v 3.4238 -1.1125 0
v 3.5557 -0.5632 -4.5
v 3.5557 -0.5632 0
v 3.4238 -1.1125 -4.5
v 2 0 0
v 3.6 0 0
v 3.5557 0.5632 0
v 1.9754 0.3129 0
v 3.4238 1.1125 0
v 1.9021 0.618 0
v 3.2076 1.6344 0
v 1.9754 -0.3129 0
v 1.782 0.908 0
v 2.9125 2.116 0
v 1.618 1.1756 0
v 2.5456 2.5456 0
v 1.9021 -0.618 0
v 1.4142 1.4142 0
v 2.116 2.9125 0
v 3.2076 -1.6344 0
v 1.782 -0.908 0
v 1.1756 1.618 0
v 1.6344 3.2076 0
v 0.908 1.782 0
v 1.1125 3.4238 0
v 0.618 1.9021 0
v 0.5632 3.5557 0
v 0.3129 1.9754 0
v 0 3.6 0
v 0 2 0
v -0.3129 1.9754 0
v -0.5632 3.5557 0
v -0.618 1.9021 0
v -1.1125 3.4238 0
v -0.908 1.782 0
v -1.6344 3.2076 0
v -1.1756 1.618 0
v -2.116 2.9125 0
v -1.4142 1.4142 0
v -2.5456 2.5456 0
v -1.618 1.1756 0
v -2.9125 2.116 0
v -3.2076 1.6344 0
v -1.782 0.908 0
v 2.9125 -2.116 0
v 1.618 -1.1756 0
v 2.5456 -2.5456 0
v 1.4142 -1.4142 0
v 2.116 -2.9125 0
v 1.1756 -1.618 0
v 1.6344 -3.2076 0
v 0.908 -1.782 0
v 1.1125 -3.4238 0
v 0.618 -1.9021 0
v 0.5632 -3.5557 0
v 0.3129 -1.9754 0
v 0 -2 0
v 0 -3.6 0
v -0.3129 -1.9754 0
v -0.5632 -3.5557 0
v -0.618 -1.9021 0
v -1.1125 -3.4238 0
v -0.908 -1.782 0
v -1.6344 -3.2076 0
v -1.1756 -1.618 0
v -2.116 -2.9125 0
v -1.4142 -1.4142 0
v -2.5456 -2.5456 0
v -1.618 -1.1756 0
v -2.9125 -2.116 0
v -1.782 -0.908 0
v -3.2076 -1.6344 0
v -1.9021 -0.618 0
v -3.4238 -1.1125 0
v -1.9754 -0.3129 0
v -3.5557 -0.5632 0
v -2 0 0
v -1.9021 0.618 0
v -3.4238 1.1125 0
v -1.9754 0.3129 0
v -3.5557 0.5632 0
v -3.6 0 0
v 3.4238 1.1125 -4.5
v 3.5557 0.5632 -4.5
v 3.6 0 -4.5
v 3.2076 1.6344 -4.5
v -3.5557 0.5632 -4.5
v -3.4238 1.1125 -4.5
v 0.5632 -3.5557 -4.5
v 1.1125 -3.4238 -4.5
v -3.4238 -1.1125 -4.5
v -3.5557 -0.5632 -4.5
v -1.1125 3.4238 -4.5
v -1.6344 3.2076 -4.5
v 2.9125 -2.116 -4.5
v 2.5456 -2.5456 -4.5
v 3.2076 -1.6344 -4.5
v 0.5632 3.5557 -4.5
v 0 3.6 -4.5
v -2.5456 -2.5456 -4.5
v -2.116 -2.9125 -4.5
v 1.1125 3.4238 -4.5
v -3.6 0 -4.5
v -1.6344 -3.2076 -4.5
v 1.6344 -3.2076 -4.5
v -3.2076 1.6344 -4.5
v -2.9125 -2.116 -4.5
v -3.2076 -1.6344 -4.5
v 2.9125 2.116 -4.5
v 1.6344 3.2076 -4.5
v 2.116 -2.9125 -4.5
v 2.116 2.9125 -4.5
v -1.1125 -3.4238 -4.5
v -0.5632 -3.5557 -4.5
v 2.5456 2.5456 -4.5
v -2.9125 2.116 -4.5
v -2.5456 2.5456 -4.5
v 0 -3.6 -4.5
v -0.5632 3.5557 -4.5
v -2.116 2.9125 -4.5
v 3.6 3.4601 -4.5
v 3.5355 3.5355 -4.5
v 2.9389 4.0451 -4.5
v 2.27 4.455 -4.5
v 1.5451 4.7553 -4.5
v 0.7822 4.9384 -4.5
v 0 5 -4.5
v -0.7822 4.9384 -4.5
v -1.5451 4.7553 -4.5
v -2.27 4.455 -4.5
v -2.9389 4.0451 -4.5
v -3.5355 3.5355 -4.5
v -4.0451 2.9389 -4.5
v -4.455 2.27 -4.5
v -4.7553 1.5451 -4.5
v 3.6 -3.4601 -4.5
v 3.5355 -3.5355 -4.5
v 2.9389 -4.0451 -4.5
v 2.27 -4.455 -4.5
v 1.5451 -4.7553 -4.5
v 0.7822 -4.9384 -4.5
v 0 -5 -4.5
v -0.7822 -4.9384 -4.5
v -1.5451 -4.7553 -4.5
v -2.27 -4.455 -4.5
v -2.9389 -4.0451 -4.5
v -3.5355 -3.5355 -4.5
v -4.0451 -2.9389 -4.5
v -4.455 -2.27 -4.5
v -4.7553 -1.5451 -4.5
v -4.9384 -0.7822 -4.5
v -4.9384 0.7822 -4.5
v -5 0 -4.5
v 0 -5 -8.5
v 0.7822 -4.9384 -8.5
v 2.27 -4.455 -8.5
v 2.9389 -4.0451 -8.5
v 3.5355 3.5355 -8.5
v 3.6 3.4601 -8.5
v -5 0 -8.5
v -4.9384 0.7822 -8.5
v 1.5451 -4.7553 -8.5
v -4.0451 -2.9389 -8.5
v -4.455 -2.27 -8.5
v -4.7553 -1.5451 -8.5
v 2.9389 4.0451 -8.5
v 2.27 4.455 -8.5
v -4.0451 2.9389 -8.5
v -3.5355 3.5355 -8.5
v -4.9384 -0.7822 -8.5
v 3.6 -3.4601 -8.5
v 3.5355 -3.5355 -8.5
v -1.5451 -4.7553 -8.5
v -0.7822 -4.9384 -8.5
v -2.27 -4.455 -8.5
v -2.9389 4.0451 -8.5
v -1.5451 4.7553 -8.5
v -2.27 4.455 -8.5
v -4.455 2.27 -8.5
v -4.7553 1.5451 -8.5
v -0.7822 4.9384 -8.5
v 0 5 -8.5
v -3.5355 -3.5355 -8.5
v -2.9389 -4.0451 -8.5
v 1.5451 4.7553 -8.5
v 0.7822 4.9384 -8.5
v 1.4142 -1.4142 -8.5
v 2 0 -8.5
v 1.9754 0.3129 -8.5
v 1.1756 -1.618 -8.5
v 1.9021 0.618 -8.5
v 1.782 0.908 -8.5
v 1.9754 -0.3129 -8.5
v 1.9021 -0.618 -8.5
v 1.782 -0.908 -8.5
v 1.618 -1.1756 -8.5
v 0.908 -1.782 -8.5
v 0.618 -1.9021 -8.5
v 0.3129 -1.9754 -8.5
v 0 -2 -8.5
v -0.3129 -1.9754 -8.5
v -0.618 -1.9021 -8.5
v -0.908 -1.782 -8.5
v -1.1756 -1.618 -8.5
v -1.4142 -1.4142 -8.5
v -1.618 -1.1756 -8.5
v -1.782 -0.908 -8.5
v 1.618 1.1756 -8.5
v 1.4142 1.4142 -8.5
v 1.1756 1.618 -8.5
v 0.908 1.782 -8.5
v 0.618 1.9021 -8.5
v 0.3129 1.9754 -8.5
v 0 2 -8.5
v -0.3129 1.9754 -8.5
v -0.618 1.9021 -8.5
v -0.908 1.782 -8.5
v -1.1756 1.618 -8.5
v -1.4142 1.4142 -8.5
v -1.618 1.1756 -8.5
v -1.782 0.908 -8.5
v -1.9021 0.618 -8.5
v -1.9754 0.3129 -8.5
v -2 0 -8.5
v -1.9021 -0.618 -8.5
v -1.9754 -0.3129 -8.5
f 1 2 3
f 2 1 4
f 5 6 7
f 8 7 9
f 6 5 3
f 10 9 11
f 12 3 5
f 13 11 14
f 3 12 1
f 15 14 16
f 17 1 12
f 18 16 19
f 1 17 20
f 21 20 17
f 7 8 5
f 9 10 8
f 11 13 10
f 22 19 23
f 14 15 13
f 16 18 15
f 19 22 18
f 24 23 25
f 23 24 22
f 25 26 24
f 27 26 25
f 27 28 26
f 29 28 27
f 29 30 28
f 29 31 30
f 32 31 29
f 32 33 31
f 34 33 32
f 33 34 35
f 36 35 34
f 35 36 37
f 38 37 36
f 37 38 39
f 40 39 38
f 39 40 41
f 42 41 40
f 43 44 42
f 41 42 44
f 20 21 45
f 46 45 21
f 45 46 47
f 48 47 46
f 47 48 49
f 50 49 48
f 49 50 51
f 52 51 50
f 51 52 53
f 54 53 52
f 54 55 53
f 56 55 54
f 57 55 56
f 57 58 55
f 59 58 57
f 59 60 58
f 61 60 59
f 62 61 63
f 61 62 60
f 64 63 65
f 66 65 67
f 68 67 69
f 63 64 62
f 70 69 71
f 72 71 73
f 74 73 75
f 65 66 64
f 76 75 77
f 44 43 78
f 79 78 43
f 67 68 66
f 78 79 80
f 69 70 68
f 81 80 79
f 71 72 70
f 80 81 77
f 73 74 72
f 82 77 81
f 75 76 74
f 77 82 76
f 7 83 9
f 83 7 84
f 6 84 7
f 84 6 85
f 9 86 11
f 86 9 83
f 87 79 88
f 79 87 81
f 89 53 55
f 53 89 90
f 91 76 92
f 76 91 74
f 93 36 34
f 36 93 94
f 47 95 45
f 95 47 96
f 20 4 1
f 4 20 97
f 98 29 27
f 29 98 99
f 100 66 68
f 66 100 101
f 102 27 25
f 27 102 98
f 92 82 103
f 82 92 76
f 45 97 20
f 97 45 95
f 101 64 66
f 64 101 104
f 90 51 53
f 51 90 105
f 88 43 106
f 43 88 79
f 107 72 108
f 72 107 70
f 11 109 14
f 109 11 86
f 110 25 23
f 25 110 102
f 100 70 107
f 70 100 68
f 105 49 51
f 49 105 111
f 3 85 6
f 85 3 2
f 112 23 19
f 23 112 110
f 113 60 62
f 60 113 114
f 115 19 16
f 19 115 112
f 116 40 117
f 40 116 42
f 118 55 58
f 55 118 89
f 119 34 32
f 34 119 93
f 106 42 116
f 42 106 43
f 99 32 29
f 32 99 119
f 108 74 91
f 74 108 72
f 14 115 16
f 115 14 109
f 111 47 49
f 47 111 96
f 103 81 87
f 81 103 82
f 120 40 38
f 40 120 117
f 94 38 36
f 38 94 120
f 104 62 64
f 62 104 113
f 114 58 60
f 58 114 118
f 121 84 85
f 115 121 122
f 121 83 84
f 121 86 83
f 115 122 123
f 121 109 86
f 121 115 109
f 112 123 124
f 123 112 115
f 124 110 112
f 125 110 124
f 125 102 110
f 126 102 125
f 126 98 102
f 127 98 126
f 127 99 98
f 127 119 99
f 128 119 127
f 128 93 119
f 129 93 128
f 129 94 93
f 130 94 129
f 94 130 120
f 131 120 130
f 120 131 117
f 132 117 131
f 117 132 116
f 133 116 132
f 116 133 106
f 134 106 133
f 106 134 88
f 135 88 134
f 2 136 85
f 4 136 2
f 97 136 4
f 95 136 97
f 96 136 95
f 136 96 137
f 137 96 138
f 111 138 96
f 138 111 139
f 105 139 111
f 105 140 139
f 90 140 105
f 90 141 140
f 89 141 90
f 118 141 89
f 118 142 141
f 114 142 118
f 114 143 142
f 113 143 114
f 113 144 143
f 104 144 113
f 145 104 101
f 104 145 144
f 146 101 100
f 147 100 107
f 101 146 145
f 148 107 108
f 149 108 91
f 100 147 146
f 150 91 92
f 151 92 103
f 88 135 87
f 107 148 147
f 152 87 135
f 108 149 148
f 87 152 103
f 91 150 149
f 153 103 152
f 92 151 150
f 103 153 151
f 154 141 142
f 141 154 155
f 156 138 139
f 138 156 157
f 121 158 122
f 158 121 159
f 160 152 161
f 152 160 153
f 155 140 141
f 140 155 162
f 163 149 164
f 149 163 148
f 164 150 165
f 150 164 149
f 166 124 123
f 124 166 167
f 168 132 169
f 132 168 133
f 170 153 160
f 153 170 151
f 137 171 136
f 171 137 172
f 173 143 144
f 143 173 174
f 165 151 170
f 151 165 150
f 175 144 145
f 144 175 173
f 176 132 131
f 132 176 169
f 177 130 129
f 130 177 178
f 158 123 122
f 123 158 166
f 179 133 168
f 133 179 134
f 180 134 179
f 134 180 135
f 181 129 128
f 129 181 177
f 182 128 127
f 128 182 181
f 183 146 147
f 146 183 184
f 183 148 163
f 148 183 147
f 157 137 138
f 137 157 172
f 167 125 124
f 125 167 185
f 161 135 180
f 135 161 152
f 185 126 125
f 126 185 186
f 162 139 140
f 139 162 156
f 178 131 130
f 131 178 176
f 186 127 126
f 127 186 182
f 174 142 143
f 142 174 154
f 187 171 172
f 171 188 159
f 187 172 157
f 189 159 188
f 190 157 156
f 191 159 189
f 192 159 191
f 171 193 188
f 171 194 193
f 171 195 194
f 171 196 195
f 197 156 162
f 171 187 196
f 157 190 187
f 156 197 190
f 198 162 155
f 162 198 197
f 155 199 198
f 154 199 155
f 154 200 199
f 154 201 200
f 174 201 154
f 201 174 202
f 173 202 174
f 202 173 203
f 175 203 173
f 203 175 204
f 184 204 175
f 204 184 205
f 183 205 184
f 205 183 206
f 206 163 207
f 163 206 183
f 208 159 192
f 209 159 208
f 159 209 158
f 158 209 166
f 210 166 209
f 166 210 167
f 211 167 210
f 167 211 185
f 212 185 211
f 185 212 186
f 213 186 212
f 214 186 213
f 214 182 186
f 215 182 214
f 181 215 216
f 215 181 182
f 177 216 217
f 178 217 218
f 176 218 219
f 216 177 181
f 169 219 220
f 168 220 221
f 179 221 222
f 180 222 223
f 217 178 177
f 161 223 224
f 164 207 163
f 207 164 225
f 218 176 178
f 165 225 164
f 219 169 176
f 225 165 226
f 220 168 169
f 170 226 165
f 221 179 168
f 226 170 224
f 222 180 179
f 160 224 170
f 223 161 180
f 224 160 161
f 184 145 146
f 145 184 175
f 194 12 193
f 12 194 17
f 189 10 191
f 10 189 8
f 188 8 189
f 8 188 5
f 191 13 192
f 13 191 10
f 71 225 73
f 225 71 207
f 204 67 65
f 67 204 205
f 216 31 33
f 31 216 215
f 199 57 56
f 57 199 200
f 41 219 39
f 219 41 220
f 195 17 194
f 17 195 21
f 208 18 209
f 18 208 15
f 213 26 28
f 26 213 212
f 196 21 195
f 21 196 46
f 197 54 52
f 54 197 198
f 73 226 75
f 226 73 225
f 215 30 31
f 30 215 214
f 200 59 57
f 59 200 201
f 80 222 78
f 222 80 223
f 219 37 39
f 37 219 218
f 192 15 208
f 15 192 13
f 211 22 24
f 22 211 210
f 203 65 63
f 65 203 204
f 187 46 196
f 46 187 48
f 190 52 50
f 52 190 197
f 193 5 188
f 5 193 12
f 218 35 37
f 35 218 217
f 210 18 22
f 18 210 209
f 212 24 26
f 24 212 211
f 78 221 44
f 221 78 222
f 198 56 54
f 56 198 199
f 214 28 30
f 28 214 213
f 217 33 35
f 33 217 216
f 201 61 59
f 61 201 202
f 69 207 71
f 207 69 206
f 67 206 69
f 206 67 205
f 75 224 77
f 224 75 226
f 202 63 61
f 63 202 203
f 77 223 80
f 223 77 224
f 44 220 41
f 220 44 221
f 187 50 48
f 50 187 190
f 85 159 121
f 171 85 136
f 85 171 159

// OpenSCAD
// file: dim.scad
FACES 				= 180;
EPSILON 			= 0.1;

// Marks - absolute location.
M_WAY_BACK          = -40;
M_POMMEL            = -37;      // approximate. hard to measure.
M_SPEAKER_BACK      = -3;       // can go pretty far. challenge is fitting on printer bed.
M_0                 = 0;        // physical back of the lightsaber main body.
M_AFT_STOP          = 10.0;
M_DISPLAY           = 12.0;
DZ_DISPLAY          = 33;
M_DISPLAY_FRONT     = M_DISPLAY + DZ_DISPLAY;

M_CRYSTAL_START     = 70.0 - 10.0 - 2.5;
M_CRYSTAL_END       = 100.0 + 10.0 + 0.5;
M_1                 = 116.3;    // mark on the saber case used for the CNC cut; used to compute other marks. 
                                // in a completely different coordinate system
M_2                 = 116.3 + 84.2; // full length of center section

DZ_CRYSTAL_SECTION  = M_CRYSTAL_END - M_CRYSTAL_START;

// These values are from the CNC
M_INSET_START       = M_1 + (63.1/2) - 20;
DZ_INSET            = 40.0;
M_INSET_END         = M_INSET_START + DZ_INSET;
DX_INSET            = 18.5;

WINDOW_0_START      = 71.1;
WINDOW_0_DZ         =  7.27;
WINDOW_1_START      = 87.1;
WINDOW_1_DZ         = 12.75;

M_PORT_CENTER       = M_INSET_START + 8.0;
M_BOLT              = M_INSET_START + 20.0;
M_SWITCH_CENTER     = M_INSET_START + 29.0;
M_USB               = M_INSET_START + 35.0;

M_EMITTER_BASE      = M_INSET_END + 4.0;

H_FAR               = 240;

D_INNER      		= 32.258;
R_INNER             = D_INNER / 2;
D_THREAD            = 33.8; // FIXME
D_OUTER             = 37.6;
R_OUTER             = D_OUTER / 2;
D_AFT               = 25.8;
R_AFT               = D_AFT / 2;

H_BUTTRESS			= 4.0;  // > 3.2 so parts can be machined in

// fixme
W_CRYSTAL           = 12.1;
H_CRYSTAL           = 8;
Y_CRYSTAL           = 11;        // offset up of the crystal

X_DOTSTAR           = 5.0 + 0.5;  // from spec
Y_DOTSTAR           = 1.4;  // from spec
DOTSTAR_STRIP       = 12.4;

STOCK_H = 6.35;     // 1/4 inch aluminum

BUTTON_WELL = 4.5;      // adjusted, depending. was: 3.5
BUTTON_HEAD_D = 7.2;
BUTTON_HEAD_H = 1.6;
BUTTON_THREAD_H = 4.0;
BUTTON_THREAD_D = 4.0;
BUTTON_UNDER_WELL = 4.0;
BUTTON_UNDER_WELL_D = 10.0;

TACTILE_POST_H = 5.5;
TACTILE_POST_D = 3.4;
TACTILE_BASE_H = 3.8;
TACTILE_BASE_X = 6.0;

M_METAL_ART = M_AFT_STOP + H_BUTTRESS*13;
DZ_METAL_ART = H_BUTTRESS*11;
Y_METAL_ART = 9;
// main file
include <dim.scad>

EPS = 0.01;
$fn = 40;

// Aligned to top
module cap() {
    color("gold") {
        translate([0, 0, -BUTTON_HEAD_H])
            cylinder(h=BUTTON_HEAD_H, d=BUTTON_HEAD_D);
        translate([0, 0, -BUTTON_HEAD_H - BUTTON_THREAD_H])
            cylinder(h=BUTTON_THREAD_H+EPS, d=BUTTON_THREAD_D- 0.1);
    }    
}

intersection() {
    translate([-100, -100, -100]) cube(size=[200, 200, 200]);
    union() {
        difference() {
            union() {
                translate([0, 0, -BUTTON_WELL])
                    cylinder(h=BUTTON_WELL, d=BUTTON_HEAD_D);
                translate([0, 0, -BUTTON_WELL - BUTTON_UNDER_WELL])
                    cylinder(h=BUTTON_UNDER_WELL, d=BUTTON_UNDER_WELL_D);
            }
            translate([0, 0, -100]) {
                cylinder(h=100 - BUTTON_THREAD_H, d=TACTILE_POST_D);
                cylinder(h=200, d=BUTTON_THREAD_D);
            }
            translate([BUTTON_HEAD_D/2, -50, -100])
                cube(size=[100, 100, 100]);
        }
        *translate([0, 0, BUTTON_HEAD_H]) cap();
    }
}
